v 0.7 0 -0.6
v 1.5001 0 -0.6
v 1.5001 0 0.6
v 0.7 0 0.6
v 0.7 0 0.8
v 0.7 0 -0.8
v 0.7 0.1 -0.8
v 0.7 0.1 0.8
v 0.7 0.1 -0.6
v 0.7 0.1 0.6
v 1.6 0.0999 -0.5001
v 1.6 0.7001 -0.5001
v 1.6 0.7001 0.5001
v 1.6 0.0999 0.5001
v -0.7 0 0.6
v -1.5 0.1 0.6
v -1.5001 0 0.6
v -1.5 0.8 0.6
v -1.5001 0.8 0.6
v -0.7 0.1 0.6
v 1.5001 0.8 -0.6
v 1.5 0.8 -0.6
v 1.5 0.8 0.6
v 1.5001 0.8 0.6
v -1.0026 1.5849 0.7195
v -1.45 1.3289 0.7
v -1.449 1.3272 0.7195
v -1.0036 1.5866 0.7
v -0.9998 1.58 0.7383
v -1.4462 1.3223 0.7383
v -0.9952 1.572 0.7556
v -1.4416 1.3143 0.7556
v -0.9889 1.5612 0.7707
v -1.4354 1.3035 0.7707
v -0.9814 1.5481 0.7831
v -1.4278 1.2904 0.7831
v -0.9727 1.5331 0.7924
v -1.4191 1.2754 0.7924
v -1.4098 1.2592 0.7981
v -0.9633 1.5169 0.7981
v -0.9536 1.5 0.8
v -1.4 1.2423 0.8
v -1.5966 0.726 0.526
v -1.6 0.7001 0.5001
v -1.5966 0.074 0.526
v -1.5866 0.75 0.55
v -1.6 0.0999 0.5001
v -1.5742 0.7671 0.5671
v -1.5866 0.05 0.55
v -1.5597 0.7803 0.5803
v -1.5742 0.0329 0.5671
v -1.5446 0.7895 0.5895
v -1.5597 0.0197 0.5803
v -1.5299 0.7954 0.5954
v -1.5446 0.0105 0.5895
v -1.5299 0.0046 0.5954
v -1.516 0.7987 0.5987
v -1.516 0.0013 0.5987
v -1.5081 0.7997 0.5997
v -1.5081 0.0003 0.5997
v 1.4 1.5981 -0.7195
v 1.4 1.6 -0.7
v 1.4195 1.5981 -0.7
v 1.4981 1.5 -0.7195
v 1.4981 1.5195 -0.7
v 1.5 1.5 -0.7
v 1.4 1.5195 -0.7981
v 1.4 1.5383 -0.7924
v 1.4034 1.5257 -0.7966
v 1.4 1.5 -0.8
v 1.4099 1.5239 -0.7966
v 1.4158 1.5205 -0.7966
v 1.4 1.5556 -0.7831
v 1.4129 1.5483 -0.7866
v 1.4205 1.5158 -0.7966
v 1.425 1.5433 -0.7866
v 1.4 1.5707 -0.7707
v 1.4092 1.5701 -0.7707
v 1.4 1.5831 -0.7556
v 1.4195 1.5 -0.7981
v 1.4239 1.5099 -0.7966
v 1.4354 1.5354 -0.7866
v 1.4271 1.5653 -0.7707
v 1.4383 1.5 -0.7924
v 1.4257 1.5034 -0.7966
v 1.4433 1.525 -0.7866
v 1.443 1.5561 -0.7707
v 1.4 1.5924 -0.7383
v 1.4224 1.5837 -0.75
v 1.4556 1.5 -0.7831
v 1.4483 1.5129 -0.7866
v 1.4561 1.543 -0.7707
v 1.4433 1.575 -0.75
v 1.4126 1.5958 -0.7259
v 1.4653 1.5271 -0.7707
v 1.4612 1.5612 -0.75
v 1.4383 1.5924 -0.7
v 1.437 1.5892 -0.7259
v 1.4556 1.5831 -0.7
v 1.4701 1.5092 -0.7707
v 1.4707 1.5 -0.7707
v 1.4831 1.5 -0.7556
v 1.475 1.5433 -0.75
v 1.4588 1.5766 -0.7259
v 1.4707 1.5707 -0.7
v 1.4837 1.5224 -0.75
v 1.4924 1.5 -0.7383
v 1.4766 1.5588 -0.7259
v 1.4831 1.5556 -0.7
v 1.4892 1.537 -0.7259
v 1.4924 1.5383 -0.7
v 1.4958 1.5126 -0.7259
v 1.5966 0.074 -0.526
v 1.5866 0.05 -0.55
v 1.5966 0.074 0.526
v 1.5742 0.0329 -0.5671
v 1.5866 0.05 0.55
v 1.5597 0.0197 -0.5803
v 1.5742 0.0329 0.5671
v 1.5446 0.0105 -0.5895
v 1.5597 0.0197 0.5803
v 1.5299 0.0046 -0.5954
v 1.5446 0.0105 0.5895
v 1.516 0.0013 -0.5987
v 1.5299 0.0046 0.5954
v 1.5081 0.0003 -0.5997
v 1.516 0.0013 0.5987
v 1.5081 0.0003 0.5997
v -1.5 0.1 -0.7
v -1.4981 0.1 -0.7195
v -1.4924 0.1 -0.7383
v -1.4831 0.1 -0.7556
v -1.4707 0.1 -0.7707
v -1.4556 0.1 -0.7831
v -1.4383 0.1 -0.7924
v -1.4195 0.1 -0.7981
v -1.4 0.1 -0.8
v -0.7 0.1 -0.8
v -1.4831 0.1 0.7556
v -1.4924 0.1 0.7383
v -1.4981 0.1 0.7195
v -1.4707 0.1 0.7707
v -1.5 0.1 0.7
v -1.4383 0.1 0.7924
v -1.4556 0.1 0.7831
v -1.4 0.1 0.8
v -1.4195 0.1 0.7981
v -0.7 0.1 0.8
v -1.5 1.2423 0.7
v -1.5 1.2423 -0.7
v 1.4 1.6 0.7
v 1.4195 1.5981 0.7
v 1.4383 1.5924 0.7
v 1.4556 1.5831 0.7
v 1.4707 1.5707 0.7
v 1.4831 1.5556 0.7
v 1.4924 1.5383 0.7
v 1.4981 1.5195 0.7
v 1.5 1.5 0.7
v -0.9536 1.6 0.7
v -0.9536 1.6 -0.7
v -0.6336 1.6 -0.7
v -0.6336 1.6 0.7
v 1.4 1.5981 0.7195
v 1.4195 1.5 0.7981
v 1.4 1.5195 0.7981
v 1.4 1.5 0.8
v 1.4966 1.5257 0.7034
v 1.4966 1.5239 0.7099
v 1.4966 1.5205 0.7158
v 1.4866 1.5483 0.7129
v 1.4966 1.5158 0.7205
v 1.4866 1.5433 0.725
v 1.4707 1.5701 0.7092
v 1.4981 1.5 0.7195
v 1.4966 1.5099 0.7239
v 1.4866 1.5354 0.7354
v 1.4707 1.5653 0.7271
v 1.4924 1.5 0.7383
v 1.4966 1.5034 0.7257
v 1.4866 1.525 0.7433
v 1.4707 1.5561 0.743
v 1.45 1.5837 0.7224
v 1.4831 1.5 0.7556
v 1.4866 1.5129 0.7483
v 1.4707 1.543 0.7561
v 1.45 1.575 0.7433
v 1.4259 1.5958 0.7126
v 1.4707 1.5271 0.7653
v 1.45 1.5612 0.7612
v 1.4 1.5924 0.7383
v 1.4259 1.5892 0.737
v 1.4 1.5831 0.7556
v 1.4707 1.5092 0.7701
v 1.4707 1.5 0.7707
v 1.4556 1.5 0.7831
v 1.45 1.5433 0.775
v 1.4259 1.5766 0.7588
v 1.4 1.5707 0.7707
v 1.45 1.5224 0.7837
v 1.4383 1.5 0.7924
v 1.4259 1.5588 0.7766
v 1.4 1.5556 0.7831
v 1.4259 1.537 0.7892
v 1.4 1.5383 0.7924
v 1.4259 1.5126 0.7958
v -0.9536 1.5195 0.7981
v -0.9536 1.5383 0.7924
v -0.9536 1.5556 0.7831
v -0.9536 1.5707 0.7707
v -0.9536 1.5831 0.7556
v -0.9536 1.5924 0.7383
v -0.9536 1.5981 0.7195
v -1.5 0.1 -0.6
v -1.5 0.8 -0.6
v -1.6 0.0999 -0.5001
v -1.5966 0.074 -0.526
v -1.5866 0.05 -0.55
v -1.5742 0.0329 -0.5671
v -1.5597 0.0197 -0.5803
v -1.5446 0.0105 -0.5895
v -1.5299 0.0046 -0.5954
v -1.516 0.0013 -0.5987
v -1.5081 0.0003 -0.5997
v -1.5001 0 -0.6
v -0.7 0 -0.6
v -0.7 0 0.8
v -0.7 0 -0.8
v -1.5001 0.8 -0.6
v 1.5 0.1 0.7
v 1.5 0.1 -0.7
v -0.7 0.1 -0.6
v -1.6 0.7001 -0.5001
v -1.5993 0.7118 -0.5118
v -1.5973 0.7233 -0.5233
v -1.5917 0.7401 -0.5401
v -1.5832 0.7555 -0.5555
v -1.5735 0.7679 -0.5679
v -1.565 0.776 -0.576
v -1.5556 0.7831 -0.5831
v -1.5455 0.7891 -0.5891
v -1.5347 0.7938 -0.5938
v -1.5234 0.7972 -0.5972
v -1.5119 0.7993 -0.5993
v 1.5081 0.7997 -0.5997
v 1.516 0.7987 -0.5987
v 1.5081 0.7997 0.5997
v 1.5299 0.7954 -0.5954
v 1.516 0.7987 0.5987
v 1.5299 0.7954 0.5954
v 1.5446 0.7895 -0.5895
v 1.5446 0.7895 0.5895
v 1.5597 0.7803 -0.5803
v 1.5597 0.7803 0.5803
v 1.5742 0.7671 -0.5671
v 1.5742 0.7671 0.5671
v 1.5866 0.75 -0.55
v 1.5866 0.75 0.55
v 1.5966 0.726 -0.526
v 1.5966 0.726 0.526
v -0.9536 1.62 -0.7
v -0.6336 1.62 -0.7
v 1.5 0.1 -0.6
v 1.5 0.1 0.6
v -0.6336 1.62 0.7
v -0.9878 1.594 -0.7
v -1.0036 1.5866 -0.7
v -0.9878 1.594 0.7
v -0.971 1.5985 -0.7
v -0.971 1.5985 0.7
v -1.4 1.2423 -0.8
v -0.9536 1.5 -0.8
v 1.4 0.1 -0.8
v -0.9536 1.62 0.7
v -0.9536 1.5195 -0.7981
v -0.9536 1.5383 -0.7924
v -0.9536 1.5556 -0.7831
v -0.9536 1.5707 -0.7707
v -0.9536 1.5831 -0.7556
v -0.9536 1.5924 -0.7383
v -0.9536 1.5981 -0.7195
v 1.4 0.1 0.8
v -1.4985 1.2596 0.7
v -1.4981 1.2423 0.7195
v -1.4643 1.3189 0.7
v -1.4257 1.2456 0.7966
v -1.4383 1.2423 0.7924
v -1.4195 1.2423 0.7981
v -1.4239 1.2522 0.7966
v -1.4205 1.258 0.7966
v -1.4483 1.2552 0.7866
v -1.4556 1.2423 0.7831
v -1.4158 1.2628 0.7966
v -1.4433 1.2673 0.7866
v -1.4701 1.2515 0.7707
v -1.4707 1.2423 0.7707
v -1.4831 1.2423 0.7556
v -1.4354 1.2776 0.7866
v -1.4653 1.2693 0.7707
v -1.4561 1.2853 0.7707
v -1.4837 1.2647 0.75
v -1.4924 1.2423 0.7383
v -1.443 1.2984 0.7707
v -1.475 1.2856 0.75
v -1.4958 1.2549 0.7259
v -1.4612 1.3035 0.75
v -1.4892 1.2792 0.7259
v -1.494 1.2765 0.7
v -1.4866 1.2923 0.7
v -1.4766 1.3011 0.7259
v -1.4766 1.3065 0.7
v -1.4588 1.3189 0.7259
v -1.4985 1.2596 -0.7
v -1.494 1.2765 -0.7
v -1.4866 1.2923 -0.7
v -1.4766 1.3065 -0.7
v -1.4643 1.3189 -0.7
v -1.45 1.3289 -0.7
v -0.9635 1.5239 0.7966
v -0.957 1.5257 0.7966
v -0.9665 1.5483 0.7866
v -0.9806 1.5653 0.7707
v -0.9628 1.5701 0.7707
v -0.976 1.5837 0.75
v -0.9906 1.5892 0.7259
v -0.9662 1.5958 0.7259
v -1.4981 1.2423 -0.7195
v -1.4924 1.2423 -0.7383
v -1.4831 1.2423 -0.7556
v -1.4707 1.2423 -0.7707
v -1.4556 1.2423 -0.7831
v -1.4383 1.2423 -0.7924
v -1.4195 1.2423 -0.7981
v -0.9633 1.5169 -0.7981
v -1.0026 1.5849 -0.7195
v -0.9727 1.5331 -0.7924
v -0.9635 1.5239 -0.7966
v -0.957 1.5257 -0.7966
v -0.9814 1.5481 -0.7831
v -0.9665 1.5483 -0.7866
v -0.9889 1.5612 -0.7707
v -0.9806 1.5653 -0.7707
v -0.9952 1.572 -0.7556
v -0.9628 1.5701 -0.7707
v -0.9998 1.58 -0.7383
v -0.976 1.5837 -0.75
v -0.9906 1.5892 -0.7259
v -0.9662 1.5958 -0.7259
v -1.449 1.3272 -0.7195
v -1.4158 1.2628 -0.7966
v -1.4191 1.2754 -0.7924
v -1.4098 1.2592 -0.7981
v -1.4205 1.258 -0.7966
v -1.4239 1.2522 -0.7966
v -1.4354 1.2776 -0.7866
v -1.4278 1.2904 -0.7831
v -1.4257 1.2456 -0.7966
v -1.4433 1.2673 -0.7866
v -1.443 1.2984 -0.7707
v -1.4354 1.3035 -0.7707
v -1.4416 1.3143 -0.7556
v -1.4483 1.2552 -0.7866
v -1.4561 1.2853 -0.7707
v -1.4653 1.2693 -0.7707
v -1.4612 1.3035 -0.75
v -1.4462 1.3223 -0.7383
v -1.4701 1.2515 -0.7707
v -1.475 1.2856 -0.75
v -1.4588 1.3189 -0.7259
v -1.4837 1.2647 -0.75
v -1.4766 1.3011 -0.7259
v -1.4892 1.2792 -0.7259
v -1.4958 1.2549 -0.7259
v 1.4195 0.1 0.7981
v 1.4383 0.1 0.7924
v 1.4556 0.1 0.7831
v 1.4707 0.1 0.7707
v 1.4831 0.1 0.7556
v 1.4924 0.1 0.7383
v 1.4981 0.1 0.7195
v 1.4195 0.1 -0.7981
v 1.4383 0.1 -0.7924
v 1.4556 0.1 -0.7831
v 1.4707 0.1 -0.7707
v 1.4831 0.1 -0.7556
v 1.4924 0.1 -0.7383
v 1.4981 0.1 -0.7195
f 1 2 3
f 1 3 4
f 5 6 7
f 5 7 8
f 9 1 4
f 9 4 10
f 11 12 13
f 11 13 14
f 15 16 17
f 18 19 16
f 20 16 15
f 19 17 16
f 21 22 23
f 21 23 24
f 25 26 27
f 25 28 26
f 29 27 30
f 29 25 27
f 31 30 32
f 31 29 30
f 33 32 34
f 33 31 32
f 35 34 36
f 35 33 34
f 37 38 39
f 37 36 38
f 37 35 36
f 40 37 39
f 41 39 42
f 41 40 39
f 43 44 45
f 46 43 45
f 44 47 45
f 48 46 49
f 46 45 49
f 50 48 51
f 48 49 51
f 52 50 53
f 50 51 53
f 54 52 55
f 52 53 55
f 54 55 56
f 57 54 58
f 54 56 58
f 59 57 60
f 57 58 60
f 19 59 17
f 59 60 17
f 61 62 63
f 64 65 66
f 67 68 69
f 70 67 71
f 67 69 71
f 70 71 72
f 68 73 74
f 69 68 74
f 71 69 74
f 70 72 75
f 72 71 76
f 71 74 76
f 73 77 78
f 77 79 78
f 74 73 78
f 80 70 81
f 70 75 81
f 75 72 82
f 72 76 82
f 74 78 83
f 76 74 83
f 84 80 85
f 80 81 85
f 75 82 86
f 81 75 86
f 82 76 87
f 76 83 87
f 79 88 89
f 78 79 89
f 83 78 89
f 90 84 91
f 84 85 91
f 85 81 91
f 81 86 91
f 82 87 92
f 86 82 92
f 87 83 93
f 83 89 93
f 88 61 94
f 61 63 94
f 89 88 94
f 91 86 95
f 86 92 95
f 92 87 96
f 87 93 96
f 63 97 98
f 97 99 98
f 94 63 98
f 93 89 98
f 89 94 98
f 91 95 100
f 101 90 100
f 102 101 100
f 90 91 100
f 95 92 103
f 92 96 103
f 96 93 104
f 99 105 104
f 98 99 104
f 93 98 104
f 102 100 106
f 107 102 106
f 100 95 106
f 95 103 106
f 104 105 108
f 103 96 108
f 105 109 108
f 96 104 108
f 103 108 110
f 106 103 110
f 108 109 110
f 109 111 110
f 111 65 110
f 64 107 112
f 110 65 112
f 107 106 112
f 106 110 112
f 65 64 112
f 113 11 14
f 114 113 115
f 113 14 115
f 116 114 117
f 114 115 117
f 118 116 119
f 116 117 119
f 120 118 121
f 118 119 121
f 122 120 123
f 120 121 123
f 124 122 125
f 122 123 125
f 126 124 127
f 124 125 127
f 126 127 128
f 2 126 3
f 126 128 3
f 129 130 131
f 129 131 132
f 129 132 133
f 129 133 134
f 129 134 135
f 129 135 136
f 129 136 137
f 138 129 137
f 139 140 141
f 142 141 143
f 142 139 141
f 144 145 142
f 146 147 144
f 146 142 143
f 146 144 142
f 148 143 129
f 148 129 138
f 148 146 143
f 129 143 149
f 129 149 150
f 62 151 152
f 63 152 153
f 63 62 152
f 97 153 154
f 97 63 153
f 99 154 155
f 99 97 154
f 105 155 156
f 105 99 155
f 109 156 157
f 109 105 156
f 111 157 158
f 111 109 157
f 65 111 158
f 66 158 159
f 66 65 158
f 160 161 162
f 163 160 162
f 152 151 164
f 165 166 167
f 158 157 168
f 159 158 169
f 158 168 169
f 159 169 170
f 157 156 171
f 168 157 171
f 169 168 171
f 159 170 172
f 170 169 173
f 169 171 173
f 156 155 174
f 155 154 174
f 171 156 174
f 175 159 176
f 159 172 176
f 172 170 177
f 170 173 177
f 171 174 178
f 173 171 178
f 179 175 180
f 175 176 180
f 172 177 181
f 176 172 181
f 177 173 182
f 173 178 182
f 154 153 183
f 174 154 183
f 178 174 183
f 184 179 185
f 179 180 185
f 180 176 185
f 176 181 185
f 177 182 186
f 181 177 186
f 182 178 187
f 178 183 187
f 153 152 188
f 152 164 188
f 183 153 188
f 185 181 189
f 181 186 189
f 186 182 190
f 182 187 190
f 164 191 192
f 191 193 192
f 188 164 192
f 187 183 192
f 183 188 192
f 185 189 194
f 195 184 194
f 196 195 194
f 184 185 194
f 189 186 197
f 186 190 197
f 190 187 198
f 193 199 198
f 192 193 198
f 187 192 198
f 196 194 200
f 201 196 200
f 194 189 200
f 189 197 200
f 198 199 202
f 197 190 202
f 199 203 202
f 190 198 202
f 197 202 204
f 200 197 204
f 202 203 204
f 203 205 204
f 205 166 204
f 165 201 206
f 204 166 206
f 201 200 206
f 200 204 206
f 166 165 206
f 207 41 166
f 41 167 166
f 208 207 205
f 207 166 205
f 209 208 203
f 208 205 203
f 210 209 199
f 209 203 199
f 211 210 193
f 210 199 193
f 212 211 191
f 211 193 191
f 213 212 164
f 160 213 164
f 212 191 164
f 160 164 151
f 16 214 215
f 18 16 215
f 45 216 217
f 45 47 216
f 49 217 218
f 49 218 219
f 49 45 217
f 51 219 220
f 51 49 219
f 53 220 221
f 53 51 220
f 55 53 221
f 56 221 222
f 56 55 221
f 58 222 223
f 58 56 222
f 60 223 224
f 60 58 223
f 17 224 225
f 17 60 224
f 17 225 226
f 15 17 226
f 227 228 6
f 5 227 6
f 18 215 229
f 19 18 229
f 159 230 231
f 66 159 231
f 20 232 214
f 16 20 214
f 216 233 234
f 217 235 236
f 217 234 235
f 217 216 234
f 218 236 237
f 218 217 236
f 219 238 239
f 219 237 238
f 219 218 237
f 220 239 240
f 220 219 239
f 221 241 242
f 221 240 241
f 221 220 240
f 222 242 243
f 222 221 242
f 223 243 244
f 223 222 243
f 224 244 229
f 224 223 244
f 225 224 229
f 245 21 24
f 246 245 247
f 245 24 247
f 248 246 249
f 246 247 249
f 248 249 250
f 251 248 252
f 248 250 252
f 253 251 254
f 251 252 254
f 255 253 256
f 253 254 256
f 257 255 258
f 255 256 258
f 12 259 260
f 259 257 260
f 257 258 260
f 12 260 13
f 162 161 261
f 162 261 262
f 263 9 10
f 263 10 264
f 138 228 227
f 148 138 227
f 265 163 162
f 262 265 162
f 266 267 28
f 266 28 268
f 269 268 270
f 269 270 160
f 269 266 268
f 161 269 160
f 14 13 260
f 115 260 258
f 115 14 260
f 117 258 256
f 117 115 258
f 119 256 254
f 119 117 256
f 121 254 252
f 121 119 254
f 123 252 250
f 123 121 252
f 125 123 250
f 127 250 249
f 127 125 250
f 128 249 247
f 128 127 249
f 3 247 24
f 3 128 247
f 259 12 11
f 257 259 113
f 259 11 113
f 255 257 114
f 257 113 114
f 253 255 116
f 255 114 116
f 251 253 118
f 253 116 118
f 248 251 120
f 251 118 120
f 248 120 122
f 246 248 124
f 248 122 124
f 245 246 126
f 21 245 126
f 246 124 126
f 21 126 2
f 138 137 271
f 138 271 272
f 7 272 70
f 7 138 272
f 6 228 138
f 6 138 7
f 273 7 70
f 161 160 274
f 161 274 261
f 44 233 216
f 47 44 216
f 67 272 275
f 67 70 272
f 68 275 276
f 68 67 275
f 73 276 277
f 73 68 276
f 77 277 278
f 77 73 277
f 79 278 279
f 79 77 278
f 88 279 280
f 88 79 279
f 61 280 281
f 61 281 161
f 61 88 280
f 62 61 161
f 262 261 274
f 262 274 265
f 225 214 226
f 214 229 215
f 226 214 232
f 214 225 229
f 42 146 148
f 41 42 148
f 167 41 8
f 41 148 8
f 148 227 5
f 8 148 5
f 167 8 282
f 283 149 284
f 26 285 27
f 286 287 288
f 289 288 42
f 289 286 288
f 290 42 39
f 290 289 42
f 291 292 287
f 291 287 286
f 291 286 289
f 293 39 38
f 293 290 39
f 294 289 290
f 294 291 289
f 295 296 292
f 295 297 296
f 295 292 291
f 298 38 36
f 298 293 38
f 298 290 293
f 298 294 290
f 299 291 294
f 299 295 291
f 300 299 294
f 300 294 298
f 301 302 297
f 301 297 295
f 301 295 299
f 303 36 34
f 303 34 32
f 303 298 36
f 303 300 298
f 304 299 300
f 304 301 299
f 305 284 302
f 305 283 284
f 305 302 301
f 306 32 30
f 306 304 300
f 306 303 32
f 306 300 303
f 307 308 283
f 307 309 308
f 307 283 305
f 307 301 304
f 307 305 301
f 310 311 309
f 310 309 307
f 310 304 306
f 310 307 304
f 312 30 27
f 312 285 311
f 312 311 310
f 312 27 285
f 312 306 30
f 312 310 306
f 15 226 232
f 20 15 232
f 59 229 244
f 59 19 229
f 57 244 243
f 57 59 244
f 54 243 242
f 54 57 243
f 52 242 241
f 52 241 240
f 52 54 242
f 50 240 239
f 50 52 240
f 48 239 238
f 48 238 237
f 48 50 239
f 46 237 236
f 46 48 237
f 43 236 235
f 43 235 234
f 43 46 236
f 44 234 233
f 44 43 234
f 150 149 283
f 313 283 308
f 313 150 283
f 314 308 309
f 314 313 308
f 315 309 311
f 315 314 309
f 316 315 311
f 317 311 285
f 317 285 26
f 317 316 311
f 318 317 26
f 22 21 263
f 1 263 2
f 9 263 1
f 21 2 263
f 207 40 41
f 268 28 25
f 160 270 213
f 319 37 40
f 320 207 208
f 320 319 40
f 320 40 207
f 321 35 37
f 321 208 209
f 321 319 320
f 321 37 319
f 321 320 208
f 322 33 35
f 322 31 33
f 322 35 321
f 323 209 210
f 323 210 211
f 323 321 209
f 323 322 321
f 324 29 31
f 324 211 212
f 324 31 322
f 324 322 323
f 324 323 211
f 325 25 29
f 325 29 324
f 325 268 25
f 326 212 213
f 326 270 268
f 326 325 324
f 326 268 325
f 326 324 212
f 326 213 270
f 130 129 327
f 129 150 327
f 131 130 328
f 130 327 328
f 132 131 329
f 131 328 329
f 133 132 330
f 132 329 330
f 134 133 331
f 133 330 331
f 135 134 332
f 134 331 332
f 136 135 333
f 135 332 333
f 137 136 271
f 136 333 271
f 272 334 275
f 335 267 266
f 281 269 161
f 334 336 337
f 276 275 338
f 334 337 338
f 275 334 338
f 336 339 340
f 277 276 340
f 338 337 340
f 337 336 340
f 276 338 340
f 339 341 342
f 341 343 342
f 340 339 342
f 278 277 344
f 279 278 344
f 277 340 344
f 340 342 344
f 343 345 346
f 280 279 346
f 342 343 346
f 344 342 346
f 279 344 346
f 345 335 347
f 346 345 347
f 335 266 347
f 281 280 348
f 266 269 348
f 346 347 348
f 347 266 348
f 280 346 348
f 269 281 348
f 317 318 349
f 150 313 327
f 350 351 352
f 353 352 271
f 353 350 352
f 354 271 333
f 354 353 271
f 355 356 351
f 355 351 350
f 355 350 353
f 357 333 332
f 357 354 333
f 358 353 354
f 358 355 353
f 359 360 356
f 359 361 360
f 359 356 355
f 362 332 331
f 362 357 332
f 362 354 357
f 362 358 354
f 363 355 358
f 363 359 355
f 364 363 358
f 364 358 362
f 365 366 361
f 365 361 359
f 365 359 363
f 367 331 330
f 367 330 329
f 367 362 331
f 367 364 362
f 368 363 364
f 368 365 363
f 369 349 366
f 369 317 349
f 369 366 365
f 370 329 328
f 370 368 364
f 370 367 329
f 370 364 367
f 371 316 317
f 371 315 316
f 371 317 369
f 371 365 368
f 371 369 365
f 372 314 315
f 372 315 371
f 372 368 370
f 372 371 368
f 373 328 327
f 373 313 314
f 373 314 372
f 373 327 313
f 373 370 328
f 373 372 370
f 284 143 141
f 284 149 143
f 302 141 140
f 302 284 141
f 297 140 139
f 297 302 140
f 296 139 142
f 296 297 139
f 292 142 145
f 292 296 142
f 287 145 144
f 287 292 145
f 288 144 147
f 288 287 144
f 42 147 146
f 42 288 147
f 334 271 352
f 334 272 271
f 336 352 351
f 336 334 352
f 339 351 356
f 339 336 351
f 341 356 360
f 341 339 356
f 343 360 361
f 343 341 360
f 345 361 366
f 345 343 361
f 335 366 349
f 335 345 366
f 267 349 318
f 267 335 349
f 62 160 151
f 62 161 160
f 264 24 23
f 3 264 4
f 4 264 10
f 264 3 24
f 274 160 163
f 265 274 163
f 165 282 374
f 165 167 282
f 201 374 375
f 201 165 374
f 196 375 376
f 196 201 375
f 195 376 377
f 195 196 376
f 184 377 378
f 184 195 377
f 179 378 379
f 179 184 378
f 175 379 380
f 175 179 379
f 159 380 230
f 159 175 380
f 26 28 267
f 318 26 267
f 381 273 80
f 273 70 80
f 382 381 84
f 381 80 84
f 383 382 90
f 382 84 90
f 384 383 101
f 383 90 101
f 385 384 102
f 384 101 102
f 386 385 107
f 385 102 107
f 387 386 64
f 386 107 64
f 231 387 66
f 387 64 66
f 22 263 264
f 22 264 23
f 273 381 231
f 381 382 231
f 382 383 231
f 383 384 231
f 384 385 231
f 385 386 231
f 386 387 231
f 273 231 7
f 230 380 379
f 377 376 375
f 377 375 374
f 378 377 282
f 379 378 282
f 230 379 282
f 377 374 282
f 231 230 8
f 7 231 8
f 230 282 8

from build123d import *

# Parameters (mm, degrees)
SKETCH_1_W             = 3
SKETCH_1_H             = 1.6
EXTRUDE_1_DEPTH        = 1.6
SKETCH_3_W             = 0.8
SKETCH_3_H             = 1.6
EXTRUDE_2_DEPTH        = 0.1
EXTRUDE_3_DEPTH        = 0.6
EXTRUDE_3_DEPTH_BACK   = 0.6
EXTRUDE_3_2_DEPTH      = 0.6
EXTRUDE_3_2_DEPTH_BACK = 0.6
CHAMFER_1_SIZE         = 0.3
CHAMFER_1_SIZE2        = 0.519615242
FILLET_1_R             = 0.1
SKETCH_7_W             = 0.32
SKETCH_7_H             = 1.4
EXTRUDE_4_DEPTH        = 0.02
FILLET_2_R             = 0.1
FILLET_3_R             = 0.1


with BuildPart() as part:
    # Эскиз1 → Бобышка-Вытянуть1 (new body)
    with BuildSketch(Plane(origin=(0, 0, 0), x_dir=(1, 0, 0), z_dir=(0, 1, 0))):
        Rectangle(SKETCH_1_W, SKETCH_1_H)
    extrude(amount=EXTRUDE_1_DEPTH)


with BuildPart() as body_2:
    # Эскиз3 → Бобышка-Вытянуть2 (new body)
    with BuildSketch(Plane.XZ):
        with Locations((-1.1, 0)):
            Rectangle(SKETCH_3_W, SKETCH_3_H)
    extrude(amount=-EXTRUDE_2_DEPTH)


with BuildPart() as body_3:
    # Зеркальное отражение1: mirrored copy
    add(body_2.part.mirror(Plane(origin=(0, 0, 0), x_dir=(0, 0, 1), z_dir=(1, 0, 0))))


with BuildPart() as part_1:
    add(part.part)

    # Combine 1: cut body 2, body 3
    add(body_2.part, mode=Mode.SUBTRACT)
    add(body_3.part, mode=Mode.SUBTRACT)

    # Фаска1
    chamfer_1_edges = [part_1.edges().sort_by_distance(p)[0] for p in [
        (-1.5, 1.6, 0),
    ]]
    chamfer_1_side = [part_1.faces().sort_by_distance(p)[0] for p in [
        (-1.5, 0.85, 0),
    ]]
    chamfer(chamfer_1_edges, length=CHAMFER_1_SIZE, length2=CHAMFER_1_SIZE2, reference=chamfer_1_side[0])

    # Скругление1
    fillet_1_edges = [part_1.edges().sort_by_distance(p)[0] for p in [
        (0.259807621, 1.6, 0.8),
        (1.5, 1.6, 0),
        (-0.980384758, 1.6, 0),
        (-1.5, 0.7, 0.8),
        (-1.240192379, 1.45, 0.8),
        (-1.5, 0.7, -0.8),
        (-1.5, 1.3, 0),
        (-1.240192379, 1.45, -0.8),
        (0.259807621, 1.6, -0.8),
        (1.5, 0.85, 0.8),
        (1.5, 0.85, -0.8),
    ]]
    fillet(fillet_1_edges, radius=FILLET_1_R)


with BuildPart() as body_2_2:
    # Эскиз5 → Бобышка-Вытянуть3 (new, two sides: drawn at the far end of the back side and taken through both)
    with BuildSketch(Plane.XY.offset(-EXTRUDE_3_DEPTH_BACK)):
        Polygon((-0.7, 0.1), (-1.5, 0.1), (-1.5, 0.8), (-1.6, 0.8), (-1.6, 0), (-0.7, 0), align=None)
    extrude(amount=EXTRUDE_3_DEPTH + EXTRUDE_3_DEPTH_BACK)

    # Скругление3
    fillet_3_edges = [body_2_2.edges().sort_by_distance(p)[0] for p in [
        (-1.6, 0, 0),
        (-1.6, 0.4, 0.6),
        (-1.6, 0.8, 0),
        (-1.6, 0.4, -0.6),
    ]]
    fillet(fillet_3_edges, radius=FILLET_3_R - 0.0001)  # a hair under: the kernel refuses the full size


with BuildPart() as body_3_2:
    # Эскиз5 → Extrude 3 2 (new, two sides: drawn at the far end of the back side and taken through both)
    with BuildSketch(Plane.XY.offset(-EXTRUDE_3_2_DEPTH_BACK)):
        Polygon((1.5, 0.1), (1.5, 0.8), (1.6, 0.8), (1.6, 0), (0.7, 0), (0.7, 0.1), align=None)
    extrude(amount=EXTRUDE_3_2_DEPTH + EXTRUDE_3_2_DEPTH_BACK)

    # Скругление2
    fillet_2_edges = [body_3_2.edges().sort_by_distance(p)[0] for p in [
        (1.6, 0.4, -0.6),
        (1.6, 0, 0),
        (1.6, 0.4, 0.6),
        (1.6, 0.8, 0),
    ]]
    fillet(fillet_2_edges, radius=FILLET_2_R - 0.0001)  # a hair under: the kernel refuses the full size


with BuildPart() as body_4:
    # Эскиз7 → Бобышка-Вытянуть4 (new body)
    with BuildSketch(Plane(origin=(0, 1.6, 0), x_dir=(1, 0, 0), z_dir=(0, 1, 0))):
        with Locations((-0.793589838, 0)):
            Rectangle(SKETCH_7_W, SKETCH_7_H)
    extrude(amount=EXTRUDE_4_DEPTH)


solid = Compound([part_1.part, body_2_2.part, body_3_2.part, body_4.part])
